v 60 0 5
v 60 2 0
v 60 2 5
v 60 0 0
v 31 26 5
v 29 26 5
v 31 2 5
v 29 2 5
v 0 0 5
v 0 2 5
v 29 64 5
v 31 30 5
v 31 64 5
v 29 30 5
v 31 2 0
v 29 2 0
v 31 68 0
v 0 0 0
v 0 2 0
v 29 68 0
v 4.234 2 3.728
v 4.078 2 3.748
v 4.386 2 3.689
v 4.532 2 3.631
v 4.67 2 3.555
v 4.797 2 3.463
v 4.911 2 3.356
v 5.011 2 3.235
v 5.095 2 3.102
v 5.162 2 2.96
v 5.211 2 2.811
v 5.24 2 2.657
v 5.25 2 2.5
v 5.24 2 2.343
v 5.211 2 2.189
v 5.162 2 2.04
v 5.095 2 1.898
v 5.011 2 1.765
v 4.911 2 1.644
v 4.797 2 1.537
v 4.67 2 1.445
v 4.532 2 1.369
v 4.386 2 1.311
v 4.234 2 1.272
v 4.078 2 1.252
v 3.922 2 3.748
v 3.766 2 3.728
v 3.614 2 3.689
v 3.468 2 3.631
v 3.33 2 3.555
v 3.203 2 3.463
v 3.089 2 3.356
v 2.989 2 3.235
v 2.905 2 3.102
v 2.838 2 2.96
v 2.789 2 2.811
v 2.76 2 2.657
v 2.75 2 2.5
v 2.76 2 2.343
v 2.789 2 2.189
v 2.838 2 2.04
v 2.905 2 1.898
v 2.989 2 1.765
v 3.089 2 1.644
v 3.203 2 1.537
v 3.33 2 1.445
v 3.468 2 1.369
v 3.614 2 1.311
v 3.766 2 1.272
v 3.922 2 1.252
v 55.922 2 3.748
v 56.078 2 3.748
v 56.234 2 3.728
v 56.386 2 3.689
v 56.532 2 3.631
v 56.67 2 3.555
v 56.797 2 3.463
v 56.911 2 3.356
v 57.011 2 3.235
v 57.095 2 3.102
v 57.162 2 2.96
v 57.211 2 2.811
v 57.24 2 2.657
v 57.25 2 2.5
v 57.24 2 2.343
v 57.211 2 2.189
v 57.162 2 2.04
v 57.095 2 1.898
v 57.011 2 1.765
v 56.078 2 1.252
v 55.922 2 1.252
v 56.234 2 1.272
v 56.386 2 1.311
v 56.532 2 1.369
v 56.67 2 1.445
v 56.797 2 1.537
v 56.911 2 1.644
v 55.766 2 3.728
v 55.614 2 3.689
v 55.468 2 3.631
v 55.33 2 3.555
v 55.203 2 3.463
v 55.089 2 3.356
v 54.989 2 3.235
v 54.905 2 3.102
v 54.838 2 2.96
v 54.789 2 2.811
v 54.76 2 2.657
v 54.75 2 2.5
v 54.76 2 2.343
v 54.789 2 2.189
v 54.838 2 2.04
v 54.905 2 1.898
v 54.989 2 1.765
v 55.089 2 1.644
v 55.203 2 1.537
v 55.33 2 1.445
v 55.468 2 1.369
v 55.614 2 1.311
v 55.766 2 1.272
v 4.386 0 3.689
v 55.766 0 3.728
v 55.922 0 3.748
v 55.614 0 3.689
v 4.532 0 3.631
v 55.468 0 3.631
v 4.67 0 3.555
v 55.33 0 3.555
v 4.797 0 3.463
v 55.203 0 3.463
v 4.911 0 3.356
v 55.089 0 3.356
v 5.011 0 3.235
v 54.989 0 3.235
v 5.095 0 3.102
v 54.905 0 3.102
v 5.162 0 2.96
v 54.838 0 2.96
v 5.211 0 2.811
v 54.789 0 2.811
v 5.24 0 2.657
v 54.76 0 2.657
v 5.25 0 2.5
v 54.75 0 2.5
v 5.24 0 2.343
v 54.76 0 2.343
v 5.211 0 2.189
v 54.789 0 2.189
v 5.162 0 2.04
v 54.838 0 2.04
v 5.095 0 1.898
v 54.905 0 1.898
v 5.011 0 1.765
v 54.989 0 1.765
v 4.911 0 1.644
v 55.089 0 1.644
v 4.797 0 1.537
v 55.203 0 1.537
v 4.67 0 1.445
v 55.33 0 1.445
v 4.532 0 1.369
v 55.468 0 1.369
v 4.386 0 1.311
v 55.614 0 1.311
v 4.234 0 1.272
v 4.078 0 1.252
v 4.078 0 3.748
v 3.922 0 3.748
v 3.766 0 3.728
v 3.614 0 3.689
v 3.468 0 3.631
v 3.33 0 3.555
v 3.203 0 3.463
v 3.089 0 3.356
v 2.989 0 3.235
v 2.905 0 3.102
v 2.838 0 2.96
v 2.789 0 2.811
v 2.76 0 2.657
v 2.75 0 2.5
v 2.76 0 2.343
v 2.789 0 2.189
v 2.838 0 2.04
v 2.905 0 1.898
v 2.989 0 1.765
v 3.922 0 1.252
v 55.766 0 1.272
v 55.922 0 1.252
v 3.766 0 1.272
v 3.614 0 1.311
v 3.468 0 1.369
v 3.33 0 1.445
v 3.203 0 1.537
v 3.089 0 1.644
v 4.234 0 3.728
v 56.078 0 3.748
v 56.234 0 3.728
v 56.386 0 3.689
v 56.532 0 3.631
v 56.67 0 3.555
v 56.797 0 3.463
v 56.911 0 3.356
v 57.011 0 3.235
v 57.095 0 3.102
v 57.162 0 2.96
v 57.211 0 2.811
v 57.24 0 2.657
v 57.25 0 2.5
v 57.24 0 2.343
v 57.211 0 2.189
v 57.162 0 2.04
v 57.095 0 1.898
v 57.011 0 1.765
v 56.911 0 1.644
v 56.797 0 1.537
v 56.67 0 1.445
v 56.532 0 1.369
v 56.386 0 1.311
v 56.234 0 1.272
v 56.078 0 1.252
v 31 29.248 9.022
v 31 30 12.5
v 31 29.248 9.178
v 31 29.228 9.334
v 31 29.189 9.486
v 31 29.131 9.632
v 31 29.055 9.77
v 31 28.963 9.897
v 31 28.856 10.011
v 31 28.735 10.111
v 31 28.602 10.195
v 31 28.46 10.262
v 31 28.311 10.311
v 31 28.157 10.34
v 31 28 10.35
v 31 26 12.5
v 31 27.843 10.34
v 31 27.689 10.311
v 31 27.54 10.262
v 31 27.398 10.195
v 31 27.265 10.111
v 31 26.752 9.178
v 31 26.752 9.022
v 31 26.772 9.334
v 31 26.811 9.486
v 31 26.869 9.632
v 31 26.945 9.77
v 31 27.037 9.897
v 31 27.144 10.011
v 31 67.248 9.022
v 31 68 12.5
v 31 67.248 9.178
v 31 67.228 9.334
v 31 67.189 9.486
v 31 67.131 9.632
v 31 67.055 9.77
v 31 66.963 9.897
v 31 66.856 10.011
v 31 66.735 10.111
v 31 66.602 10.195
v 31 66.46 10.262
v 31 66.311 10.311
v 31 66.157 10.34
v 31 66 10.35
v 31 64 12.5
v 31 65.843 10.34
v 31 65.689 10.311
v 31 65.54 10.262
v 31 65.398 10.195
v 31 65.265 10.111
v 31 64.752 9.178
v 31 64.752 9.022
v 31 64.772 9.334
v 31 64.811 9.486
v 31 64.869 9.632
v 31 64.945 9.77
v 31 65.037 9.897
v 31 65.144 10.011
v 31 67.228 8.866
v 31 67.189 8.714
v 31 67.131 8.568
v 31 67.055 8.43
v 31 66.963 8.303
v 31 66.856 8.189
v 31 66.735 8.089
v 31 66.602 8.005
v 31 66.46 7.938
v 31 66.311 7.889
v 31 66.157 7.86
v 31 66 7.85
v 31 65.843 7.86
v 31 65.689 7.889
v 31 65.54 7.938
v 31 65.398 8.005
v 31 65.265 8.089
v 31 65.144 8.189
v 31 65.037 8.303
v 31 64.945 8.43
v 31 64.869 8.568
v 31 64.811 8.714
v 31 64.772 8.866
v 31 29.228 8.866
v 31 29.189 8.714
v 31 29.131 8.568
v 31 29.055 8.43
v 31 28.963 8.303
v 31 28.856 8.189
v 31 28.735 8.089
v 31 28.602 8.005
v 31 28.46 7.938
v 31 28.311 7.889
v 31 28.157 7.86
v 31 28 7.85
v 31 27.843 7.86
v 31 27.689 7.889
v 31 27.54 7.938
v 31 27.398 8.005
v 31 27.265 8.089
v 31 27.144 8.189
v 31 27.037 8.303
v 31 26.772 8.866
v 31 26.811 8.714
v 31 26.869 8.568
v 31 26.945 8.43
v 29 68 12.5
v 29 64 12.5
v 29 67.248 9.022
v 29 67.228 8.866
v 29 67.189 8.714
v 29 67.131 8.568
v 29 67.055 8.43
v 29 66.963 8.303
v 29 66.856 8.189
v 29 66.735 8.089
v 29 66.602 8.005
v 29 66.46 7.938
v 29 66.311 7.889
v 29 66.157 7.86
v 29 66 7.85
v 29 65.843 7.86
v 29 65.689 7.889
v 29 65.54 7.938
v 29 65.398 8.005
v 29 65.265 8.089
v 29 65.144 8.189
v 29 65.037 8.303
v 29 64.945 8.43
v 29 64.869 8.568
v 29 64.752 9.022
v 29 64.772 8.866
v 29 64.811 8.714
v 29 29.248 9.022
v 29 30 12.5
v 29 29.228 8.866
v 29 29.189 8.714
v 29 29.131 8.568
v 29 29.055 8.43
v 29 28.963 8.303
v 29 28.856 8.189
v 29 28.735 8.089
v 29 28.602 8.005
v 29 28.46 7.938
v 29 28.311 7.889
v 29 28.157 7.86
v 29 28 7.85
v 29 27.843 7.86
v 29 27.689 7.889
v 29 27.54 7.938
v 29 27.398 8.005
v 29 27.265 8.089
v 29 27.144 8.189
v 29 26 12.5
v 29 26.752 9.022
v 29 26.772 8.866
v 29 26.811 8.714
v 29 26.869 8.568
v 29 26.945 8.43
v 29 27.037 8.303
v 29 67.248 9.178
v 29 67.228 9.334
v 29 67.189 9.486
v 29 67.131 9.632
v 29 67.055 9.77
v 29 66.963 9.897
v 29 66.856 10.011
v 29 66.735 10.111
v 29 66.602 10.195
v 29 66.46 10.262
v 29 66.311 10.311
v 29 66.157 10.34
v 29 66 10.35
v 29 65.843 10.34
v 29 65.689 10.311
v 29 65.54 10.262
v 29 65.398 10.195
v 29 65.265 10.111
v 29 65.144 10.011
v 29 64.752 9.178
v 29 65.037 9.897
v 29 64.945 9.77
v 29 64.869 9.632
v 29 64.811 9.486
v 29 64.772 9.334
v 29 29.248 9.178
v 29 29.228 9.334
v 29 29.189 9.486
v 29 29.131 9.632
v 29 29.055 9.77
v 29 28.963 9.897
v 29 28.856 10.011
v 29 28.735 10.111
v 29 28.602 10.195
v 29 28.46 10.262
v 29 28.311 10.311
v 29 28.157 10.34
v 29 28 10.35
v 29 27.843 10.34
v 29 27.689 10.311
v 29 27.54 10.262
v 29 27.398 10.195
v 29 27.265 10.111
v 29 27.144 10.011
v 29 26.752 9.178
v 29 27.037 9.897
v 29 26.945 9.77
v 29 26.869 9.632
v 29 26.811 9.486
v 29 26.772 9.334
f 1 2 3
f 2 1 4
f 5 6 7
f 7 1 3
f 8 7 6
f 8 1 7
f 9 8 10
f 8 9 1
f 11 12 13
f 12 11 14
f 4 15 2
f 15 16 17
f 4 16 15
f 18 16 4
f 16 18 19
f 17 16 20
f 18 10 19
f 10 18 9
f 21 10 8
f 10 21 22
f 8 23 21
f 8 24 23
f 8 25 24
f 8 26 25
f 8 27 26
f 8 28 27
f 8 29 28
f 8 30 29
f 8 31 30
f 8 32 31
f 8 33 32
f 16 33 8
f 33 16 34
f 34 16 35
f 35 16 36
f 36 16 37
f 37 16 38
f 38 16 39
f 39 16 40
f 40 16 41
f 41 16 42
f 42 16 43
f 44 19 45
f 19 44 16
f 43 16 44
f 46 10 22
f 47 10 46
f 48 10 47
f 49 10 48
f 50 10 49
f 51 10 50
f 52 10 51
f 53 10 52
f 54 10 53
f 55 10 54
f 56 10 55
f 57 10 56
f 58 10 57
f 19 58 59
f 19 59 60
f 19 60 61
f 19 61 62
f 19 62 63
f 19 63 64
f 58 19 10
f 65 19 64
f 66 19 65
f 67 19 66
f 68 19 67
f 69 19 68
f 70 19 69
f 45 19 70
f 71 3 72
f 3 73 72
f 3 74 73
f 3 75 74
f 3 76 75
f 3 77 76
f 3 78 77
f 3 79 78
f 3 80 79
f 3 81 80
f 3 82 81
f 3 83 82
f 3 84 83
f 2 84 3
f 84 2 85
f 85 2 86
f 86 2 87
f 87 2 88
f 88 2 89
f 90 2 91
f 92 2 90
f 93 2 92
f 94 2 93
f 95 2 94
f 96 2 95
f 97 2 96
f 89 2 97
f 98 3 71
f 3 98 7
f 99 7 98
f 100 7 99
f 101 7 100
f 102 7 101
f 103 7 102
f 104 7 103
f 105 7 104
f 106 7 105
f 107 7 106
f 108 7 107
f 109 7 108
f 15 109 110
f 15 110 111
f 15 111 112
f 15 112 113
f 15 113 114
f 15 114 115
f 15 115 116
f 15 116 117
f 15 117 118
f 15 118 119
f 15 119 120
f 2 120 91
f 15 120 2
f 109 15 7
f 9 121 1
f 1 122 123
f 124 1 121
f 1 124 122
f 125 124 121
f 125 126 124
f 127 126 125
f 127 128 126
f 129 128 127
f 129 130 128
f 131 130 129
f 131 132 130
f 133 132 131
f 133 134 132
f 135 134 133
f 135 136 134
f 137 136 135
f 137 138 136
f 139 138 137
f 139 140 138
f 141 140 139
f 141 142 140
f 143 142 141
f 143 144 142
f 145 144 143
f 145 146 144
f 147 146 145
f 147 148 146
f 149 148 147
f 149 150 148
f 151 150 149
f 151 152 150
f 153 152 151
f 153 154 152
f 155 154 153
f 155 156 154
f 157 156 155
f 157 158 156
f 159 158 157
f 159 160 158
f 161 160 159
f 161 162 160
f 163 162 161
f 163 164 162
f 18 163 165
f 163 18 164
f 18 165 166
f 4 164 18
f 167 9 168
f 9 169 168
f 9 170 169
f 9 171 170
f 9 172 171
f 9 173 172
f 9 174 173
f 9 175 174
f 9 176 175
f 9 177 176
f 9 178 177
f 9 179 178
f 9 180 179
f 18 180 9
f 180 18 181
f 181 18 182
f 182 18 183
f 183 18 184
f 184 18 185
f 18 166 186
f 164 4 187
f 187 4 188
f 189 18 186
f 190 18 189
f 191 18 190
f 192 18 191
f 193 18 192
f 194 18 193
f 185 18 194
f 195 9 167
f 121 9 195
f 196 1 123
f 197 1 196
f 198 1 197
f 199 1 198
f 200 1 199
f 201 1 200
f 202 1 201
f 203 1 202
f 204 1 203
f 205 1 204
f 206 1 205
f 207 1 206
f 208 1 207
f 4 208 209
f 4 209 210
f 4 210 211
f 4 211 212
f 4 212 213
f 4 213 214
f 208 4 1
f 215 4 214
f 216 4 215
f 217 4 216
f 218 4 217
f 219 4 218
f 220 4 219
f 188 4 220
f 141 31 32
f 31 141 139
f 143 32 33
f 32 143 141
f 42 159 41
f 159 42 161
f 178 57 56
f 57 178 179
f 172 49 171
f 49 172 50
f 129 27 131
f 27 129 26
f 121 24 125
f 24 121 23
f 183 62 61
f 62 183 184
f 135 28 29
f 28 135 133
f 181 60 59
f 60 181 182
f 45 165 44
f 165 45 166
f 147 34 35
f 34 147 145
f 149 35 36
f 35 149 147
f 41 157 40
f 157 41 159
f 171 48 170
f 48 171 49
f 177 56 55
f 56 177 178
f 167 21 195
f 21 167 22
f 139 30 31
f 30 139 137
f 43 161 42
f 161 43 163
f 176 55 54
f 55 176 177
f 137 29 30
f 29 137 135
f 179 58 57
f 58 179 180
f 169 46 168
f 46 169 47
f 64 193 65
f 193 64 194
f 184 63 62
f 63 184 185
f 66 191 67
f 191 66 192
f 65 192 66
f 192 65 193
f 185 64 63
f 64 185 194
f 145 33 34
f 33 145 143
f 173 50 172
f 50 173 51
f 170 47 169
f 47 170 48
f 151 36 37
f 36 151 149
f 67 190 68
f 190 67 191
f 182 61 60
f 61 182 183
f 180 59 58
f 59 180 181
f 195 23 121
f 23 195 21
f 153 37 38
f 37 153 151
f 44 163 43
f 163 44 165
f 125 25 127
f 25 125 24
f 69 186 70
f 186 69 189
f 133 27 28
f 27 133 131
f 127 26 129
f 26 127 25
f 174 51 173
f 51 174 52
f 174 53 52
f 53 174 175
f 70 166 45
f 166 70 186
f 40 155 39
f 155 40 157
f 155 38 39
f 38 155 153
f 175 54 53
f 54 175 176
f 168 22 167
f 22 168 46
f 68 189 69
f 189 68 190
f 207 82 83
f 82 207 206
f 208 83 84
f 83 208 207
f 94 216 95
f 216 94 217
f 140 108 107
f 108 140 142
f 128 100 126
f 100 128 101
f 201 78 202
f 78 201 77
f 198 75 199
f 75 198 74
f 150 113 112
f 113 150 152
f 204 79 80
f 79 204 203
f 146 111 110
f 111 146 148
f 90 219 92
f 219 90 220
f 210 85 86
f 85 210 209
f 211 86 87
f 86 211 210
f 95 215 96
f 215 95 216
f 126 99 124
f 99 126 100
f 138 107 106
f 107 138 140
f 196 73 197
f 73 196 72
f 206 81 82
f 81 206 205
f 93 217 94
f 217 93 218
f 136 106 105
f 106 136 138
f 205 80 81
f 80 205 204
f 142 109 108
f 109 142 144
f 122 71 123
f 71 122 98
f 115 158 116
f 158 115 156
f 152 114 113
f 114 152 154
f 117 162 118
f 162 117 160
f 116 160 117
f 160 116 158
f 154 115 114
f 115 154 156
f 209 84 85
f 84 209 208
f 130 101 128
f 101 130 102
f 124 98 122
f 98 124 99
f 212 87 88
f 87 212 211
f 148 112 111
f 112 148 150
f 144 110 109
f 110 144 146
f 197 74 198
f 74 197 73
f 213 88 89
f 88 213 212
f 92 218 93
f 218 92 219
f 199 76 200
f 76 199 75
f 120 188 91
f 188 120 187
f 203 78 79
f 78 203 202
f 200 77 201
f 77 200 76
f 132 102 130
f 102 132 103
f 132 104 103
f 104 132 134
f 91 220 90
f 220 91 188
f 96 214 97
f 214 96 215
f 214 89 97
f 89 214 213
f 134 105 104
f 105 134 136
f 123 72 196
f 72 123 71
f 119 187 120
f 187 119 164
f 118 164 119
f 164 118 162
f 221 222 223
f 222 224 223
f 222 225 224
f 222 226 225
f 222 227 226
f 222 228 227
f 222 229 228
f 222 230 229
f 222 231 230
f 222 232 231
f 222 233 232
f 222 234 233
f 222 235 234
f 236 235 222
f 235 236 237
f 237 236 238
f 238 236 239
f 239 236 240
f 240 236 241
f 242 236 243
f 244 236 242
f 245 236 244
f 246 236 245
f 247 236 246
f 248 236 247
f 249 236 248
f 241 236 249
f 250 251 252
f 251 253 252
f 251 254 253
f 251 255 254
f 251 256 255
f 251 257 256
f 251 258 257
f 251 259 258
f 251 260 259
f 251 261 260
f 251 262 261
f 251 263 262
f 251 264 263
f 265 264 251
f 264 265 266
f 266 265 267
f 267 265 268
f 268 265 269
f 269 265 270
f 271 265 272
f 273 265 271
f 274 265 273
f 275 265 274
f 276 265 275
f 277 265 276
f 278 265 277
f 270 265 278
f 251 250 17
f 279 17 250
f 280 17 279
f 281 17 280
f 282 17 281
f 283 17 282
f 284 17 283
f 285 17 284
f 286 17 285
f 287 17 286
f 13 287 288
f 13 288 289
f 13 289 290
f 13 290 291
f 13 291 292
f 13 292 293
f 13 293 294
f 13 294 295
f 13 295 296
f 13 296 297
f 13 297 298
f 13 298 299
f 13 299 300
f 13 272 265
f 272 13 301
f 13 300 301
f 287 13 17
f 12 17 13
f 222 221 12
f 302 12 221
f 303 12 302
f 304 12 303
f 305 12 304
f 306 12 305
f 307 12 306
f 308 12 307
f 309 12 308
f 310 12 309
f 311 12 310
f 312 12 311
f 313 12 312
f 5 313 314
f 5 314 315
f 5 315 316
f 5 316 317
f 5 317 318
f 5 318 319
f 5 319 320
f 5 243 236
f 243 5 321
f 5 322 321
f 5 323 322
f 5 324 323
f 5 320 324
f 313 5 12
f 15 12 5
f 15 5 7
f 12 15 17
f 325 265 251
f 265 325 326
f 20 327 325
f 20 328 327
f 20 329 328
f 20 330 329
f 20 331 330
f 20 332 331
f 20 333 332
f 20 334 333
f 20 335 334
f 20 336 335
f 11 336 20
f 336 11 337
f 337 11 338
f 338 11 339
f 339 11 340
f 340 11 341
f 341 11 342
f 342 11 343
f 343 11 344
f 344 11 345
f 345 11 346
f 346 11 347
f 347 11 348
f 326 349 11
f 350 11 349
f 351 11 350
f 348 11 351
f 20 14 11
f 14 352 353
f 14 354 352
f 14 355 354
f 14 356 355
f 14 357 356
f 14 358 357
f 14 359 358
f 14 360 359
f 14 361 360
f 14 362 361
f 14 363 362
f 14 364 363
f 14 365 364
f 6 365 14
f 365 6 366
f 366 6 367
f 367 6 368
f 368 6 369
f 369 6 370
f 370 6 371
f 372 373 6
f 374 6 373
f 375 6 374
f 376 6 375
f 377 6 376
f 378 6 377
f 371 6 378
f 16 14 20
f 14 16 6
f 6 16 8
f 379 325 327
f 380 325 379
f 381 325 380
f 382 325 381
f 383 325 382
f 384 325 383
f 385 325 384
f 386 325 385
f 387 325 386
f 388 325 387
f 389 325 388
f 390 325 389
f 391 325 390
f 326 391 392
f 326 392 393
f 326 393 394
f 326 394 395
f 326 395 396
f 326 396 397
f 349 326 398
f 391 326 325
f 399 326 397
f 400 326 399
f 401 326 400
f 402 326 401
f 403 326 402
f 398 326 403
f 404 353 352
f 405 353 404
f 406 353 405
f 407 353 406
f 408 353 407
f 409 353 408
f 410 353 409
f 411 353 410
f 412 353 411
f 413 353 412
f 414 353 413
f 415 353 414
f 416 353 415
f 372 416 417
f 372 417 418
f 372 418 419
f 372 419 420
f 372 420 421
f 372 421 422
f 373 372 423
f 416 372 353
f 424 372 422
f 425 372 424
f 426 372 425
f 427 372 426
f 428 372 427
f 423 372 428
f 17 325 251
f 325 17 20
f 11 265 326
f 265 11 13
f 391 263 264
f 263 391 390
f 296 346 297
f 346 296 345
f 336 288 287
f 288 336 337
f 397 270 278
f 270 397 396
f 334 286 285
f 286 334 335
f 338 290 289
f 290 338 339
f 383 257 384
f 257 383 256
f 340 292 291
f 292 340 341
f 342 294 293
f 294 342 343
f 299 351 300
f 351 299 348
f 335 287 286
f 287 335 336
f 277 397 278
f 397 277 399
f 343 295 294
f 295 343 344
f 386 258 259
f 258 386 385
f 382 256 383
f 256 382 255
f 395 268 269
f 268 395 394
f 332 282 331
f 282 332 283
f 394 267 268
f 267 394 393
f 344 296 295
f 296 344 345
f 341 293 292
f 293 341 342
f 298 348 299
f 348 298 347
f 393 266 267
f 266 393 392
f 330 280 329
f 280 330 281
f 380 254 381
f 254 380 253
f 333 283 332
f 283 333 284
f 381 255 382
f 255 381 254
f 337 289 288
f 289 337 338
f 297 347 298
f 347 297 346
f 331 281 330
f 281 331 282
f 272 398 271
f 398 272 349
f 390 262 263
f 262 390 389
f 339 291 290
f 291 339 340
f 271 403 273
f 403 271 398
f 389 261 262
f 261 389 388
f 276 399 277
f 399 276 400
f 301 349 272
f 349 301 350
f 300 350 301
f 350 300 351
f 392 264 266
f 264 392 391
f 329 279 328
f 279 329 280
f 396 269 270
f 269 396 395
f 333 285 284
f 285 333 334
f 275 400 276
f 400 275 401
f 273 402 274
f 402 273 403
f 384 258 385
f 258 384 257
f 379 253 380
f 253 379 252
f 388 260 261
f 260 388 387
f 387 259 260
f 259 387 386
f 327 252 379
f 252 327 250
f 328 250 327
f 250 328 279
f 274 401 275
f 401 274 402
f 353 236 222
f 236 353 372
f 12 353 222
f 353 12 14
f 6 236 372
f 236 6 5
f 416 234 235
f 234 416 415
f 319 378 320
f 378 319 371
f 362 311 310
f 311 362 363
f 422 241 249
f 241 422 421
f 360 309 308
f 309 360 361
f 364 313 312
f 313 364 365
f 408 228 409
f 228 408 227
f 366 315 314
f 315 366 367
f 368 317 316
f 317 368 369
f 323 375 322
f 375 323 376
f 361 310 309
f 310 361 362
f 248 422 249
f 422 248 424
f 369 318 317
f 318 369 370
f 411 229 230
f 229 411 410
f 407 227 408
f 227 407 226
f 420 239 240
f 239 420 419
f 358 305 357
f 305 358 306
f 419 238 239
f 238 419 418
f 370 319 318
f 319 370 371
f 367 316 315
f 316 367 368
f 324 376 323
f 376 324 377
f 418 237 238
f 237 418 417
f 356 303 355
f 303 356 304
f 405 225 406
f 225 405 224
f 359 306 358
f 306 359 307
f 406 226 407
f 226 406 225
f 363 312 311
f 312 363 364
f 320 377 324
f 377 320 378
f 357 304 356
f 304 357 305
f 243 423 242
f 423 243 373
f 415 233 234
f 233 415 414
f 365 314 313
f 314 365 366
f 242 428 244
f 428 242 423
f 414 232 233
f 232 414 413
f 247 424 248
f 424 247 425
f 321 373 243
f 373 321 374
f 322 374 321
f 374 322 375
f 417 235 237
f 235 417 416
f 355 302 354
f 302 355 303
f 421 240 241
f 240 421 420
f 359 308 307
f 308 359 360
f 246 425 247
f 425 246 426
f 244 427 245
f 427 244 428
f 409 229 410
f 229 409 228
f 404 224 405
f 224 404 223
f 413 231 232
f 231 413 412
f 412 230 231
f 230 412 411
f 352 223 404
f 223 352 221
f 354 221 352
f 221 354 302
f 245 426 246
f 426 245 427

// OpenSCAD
$fn = 50;
t = 2;
module screw_hole() {
        cylinder(t, d=2.5);
}

module side_holder() {
    difference() {
        cube([t,4,7.5]);
        translate([0, 2, 4.1]) {
            rotate([0,90,0]){
                screw_hole();
            }
        }
    }
}




difference(){
    cube([60,t,5]);

    translate([4, t, 5/2]){
        rotate([90,0,0]){
            screw_hole();
        }
    }
    
    translate([60-4, t, 5/2]){
        rotate([90,0,0]){
            screw_hole();
        }
    }
}

translate([60/2 - t/2, 0, 0]) {
    cube([t,68,5]);
}

translate([60/2 - t/2, 68 - 4, 5]) {
    side_holder();
}

translate([60/2 - t/2, 68 - 4 - 38, 5]) {
    side_holder();
}
